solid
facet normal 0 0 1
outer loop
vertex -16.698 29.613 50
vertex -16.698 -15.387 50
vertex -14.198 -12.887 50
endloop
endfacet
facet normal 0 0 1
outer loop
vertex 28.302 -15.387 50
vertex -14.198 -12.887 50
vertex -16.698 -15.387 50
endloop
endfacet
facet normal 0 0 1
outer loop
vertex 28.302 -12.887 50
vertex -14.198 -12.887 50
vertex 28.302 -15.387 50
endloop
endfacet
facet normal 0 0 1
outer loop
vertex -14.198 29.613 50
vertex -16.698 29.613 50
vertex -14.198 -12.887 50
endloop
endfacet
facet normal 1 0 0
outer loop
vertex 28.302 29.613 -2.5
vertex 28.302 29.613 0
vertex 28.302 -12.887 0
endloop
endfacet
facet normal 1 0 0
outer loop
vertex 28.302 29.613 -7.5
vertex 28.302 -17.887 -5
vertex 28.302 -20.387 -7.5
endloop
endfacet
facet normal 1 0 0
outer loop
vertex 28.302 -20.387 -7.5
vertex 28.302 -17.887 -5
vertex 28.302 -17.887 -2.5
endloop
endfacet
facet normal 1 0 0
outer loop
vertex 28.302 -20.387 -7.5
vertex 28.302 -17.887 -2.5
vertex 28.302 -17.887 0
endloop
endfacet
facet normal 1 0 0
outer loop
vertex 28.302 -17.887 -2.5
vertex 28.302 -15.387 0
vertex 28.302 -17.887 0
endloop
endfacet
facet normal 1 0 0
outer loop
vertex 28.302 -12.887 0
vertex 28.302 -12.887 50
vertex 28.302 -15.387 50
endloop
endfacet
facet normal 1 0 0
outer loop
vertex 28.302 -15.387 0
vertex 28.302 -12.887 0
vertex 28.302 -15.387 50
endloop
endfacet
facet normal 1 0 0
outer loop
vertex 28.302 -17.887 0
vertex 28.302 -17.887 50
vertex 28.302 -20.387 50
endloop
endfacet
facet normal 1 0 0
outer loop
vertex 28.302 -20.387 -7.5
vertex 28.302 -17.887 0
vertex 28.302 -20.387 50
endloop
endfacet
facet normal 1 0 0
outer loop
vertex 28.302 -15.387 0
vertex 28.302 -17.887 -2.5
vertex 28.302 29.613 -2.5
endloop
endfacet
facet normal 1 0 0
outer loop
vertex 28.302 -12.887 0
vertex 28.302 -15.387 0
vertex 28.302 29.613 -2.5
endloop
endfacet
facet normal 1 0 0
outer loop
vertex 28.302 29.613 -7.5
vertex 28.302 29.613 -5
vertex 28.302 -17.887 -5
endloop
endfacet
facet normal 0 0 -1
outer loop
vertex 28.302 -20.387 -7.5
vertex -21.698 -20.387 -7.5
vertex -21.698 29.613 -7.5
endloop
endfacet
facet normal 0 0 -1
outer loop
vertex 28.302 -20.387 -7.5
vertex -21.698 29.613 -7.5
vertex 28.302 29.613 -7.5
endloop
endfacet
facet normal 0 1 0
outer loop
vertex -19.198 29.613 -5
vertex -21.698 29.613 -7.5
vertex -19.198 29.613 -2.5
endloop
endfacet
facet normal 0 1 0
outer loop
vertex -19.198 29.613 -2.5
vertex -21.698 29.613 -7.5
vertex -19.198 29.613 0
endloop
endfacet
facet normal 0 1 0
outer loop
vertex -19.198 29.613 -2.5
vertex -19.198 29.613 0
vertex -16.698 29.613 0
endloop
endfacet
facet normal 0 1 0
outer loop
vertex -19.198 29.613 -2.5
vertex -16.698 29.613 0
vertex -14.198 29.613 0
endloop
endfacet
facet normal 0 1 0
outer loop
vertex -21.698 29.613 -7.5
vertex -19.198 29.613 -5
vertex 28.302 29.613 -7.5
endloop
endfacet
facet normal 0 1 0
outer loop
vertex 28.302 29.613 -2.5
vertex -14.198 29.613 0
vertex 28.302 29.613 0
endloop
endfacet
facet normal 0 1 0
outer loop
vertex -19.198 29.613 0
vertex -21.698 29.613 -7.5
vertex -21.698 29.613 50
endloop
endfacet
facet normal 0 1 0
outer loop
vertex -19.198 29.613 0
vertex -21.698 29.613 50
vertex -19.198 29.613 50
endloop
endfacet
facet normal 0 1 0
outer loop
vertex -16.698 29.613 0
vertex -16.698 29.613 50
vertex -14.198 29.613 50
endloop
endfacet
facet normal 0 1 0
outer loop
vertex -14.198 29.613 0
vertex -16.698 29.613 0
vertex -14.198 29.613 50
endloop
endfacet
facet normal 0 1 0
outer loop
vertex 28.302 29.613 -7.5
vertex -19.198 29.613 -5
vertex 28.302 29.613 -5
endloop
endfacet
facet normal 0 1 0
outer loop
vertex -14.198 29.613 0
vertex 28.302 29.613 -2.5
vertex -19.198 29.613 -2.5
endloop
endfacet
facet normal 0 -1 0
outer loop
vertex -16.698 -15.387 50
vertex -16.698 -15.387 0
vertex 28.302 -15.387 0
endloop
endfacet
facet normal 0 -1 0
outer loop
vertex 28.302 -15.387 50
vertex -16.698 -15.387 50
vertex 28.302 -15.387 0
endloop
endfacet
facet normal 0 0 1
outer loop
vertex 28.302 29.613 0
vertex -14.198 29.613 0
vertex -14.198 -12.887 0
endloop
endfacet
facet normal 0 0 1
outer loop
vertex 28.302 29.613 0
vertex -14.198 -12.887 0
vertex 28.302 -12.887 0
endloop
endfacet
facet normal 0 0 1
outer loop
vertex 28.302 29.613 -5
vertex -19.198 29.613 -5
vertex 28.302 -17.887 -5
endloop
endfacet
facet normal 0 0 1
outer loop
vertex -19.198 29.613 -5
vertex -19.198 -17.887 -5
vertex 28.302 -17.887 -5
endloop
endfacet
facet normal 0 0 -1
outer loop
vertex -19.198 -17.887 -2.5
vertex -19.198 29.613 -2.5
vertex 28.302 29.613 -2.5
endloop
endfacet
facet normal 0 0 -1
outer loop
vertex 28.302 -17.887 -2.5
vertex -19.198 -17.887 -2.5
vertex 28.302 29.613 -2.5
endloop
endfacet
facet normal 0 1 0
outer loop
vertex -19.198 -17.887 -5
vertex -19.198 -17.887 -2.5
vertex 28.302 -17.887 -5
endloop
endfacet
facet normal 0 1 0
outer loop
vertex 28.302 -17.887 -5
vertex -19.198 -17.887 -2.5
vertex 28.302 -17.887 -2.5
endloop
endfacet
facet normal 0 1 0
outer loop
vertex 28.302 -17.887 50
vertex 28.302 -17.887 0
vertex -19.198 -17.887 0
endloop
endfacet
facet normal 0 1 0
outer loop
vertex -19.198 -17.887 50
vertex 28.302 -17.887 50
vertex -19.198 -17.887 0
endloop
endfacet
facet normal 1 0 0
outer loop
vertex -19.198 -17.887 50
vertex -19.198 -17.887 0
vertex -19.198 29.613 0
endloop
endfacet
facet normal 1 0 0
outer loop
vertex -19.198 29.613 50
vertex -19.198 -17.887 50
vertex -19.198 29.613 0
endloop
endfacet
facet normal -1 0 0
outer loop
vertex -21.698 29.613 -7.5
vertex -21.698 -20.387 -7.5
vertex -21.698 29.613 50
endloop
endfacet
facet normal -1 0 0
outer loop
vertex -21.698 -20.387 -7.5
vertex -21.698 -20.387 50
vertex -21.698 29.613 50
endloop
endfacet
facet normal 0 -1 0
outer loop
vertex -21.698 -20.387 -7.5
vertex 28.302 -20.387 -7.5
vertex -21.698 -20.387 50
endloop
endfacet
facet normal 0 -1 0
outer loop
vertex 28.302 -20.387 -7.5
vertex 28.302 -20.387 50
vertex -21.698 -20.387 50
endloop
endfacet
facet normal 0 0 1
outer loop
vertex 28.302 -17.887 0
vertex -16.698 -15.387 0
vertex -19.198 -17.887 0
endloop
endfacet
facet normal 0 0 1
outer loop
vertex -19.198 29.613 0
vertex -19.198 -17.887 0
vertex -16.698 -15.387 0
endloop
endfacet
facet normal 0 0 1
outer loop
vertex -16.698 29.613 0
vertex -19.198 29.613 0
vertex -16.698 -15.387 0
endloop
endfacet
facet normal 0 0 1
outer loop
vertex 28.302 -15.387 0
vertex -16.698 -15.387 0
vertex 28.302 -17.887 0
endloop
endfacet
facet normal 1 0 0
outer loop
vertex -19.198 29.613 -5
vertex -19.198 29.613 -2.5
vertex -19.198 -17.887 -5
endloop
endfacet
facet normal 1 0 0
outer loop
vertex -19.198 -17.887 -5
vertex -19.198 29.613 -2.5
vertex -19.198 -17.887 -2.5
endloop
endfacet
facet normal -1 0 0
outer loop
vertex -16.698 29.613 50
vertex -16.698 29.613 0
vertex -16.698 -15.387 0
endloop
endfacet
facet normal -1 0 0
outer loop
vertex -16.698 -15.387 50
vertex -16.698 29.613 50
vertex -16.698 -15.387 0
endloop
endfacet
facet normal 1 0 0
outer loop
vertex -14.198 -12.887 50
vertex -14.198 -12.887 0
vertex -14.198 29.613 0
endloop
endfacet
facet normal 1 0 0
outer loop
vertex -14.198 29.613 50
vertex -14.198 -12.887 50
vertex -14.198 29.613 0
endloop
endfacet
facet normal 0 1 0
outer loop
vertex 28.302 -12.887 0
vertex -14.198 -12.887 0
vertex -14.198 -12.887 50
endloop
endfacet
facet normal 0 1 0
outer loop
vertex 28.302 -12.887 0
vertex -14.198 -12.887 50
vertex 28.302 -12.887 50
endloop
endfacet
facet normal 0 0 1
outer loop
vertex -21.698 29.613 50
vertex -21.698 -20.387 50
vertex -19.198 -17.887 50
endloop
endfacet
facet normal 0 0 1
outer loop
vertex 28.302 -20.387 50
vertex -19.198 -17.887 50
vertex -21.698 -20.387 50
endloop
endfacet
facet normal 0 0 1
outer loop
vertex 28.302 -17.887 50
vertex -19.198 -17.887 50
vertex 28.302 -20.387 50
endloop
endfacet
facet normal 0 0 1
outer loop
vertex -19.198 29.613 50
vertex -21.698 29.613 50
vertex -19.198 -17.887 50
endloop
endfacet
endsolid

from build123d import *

# Parameters (mm, degrees)
F0_W     = 42.5
F0_H     = 42.5
F0_W_2   = 2.5
F0_H_2   = 2.5
F1_DEPTH = 2.5
F2_DEPTH = 50
F3_W     = 2.5
F3_H     = 47.5
F3_W_2   = 47.5
F3_H_2   = 2.5
F4_DEPTH = 2.5
F5_W     = 47.5
F5_H     = 47.5
F6_DEPTH = 2.5


with BuildPart() as f1:
    # F0 (on Top) → F1 (new body)
    with BuildSketch(Plane.XY):
        with Locations((7.0520306379, 8.3629446477)):
            Rectangle(F0_W, F0_H)
        with Locations((-15.4479693621, 8.3629446477)):
            Rectangle(F0_W_2, F0_H)
        with Locations((-17.9479693621, 8.3629446477)):
            Rectangle(F0_W_2, F0_H)
        with Locations((-20.4479693621, 8.3629446477)):
            Rectangle(F0_W_2, F0_H)
        with Locations((7.0520306379, -14.1370553523)):
            Rectangle(F0_W, F0_H_2)
        with Locations((7.0520306379, -16.6370553523)):
            Rectangle(F0_W, F0_H_2)
        with Locations((7.0520306379, -19.1370553523)):
            Rectangle(F0_W, F0_H_2)
        with Locations((-15.4479693621, -19.1370553523)):
            Rectangle(F0_W_2, F0_H_2)
        with Locations((-17.9479693621, -19.1370553523)):
            Rectangle(F0_W_2, F0_H_2)
        with Locations((-20.4479693621, -19.1370553523)):
            Rectangle(F0_W_2, F0_H_2)
        with Locations((-20.4479693621, -16.6370553523)):
            Rectangle(F0_W_2, F0_H_2)
        with Locations((-17.9479693621, -16.6370553523)):
            Rectangle(F0_W_2, F0_H_2)
        with Locations((-15.4479693621, -16.6370553523)):
            Rectangle(F0_W_2, F0_H_2)
        with Locations((-15.4479693621, -14.1370553523)):
            Rectangle(F0_W_2, F0_H_2)
        with Locations((-17.9479693621, -14.1370553523)):
            Rectangle(F0_W_2, F0_H_2)
        with Locations((-20.4479693621, -14.1370553523)):
            Rectangle(F0_W_2, F0_H_2)
    extrude(amount=-F1_DEPTH)

    # F0 (on Top) → F2 (join)
    with BuildSketch(Plane.XY):
        with Locations((-20.4479693621, 8.3629446477)):
            Rectangle(F0_W_2, F0_H)
        with Locations((-20.4479693621, -14.1370553523)):
            Rectangle(F0_W_2, F0_H_2)
        with Locations((-15.4479693621, 8.3629446477)):
            Rectangle(F0_W_2, F0_H)
        with Locations((-15.4479693621, -14.1370553523)):
            Rectangle(F0_W_2, F0_H_2)
        with Locations((-15.4479693621, -19.1370553523)):
            Rectangle(F0_W_2, F0_H_2)
        with Locations((7.0520306379, -14.1370553523)):
            Rectangle(F0_W, F0_H_2)
        with Locations((-17.9479693621, -19.1370553523)):
            Rectangle(F0_W_2, F0_H_2)
        with Locations((-20.4479693621, -19.1370553523)):
            Rectangle(F0_W_2, F0_H_2)
        with Locations((7.0520306379, -19.1370553523)):
            Rectangle(F0_W, F0_H_2)
        with Locations((-20.4479693621, -16.6370553523)):
            Rectangle(F0_W_2, F0_H_2)
    extrude(amount=F2_DEPTH)

    # F3 (on face) → F4 (join)
    with BuildSketch(Plane(origin=(0, 0, -2.5), x_dir=(1, 0, 0), z_dir=(0, 0, -1))):
        with Locations((-20.4479693621, -5.8629446477)):
            Rectangle(F3_W, F3_H)
        with Locations((4.5520306379, 19.1370553523)):
            Rectangle(F3_W_2, F3_H_2)
        with Locations((-20.4479693621, 19.1370553523)):
            Rectangle(F3_W, F3_H_2)
    extrude(amount=F4_DEPTH)

    # F5 (on face) → F6 (join)
    with BuildSketch(Plane(origin=(0, 0, -5), x_dir=(1, 0, 0), z_dir=(0, 0, -1))):
        with Locations((4.5520306379, -5.8629446477)):
            Rectangle(F5_W, F5_H)
        Polygon((28.3020306379, 20.3870553523), (-21.6979693621, 20.3870553523), (-21.6979693621, -29.6129446477), (-19.1979693621, -29.6129446477), (-19.1979693621, 17.8870553523), (28.3020306379, 17.8870553523), align=None)
    extrude(amount=F6_DEPTH)


solid = f1.part
